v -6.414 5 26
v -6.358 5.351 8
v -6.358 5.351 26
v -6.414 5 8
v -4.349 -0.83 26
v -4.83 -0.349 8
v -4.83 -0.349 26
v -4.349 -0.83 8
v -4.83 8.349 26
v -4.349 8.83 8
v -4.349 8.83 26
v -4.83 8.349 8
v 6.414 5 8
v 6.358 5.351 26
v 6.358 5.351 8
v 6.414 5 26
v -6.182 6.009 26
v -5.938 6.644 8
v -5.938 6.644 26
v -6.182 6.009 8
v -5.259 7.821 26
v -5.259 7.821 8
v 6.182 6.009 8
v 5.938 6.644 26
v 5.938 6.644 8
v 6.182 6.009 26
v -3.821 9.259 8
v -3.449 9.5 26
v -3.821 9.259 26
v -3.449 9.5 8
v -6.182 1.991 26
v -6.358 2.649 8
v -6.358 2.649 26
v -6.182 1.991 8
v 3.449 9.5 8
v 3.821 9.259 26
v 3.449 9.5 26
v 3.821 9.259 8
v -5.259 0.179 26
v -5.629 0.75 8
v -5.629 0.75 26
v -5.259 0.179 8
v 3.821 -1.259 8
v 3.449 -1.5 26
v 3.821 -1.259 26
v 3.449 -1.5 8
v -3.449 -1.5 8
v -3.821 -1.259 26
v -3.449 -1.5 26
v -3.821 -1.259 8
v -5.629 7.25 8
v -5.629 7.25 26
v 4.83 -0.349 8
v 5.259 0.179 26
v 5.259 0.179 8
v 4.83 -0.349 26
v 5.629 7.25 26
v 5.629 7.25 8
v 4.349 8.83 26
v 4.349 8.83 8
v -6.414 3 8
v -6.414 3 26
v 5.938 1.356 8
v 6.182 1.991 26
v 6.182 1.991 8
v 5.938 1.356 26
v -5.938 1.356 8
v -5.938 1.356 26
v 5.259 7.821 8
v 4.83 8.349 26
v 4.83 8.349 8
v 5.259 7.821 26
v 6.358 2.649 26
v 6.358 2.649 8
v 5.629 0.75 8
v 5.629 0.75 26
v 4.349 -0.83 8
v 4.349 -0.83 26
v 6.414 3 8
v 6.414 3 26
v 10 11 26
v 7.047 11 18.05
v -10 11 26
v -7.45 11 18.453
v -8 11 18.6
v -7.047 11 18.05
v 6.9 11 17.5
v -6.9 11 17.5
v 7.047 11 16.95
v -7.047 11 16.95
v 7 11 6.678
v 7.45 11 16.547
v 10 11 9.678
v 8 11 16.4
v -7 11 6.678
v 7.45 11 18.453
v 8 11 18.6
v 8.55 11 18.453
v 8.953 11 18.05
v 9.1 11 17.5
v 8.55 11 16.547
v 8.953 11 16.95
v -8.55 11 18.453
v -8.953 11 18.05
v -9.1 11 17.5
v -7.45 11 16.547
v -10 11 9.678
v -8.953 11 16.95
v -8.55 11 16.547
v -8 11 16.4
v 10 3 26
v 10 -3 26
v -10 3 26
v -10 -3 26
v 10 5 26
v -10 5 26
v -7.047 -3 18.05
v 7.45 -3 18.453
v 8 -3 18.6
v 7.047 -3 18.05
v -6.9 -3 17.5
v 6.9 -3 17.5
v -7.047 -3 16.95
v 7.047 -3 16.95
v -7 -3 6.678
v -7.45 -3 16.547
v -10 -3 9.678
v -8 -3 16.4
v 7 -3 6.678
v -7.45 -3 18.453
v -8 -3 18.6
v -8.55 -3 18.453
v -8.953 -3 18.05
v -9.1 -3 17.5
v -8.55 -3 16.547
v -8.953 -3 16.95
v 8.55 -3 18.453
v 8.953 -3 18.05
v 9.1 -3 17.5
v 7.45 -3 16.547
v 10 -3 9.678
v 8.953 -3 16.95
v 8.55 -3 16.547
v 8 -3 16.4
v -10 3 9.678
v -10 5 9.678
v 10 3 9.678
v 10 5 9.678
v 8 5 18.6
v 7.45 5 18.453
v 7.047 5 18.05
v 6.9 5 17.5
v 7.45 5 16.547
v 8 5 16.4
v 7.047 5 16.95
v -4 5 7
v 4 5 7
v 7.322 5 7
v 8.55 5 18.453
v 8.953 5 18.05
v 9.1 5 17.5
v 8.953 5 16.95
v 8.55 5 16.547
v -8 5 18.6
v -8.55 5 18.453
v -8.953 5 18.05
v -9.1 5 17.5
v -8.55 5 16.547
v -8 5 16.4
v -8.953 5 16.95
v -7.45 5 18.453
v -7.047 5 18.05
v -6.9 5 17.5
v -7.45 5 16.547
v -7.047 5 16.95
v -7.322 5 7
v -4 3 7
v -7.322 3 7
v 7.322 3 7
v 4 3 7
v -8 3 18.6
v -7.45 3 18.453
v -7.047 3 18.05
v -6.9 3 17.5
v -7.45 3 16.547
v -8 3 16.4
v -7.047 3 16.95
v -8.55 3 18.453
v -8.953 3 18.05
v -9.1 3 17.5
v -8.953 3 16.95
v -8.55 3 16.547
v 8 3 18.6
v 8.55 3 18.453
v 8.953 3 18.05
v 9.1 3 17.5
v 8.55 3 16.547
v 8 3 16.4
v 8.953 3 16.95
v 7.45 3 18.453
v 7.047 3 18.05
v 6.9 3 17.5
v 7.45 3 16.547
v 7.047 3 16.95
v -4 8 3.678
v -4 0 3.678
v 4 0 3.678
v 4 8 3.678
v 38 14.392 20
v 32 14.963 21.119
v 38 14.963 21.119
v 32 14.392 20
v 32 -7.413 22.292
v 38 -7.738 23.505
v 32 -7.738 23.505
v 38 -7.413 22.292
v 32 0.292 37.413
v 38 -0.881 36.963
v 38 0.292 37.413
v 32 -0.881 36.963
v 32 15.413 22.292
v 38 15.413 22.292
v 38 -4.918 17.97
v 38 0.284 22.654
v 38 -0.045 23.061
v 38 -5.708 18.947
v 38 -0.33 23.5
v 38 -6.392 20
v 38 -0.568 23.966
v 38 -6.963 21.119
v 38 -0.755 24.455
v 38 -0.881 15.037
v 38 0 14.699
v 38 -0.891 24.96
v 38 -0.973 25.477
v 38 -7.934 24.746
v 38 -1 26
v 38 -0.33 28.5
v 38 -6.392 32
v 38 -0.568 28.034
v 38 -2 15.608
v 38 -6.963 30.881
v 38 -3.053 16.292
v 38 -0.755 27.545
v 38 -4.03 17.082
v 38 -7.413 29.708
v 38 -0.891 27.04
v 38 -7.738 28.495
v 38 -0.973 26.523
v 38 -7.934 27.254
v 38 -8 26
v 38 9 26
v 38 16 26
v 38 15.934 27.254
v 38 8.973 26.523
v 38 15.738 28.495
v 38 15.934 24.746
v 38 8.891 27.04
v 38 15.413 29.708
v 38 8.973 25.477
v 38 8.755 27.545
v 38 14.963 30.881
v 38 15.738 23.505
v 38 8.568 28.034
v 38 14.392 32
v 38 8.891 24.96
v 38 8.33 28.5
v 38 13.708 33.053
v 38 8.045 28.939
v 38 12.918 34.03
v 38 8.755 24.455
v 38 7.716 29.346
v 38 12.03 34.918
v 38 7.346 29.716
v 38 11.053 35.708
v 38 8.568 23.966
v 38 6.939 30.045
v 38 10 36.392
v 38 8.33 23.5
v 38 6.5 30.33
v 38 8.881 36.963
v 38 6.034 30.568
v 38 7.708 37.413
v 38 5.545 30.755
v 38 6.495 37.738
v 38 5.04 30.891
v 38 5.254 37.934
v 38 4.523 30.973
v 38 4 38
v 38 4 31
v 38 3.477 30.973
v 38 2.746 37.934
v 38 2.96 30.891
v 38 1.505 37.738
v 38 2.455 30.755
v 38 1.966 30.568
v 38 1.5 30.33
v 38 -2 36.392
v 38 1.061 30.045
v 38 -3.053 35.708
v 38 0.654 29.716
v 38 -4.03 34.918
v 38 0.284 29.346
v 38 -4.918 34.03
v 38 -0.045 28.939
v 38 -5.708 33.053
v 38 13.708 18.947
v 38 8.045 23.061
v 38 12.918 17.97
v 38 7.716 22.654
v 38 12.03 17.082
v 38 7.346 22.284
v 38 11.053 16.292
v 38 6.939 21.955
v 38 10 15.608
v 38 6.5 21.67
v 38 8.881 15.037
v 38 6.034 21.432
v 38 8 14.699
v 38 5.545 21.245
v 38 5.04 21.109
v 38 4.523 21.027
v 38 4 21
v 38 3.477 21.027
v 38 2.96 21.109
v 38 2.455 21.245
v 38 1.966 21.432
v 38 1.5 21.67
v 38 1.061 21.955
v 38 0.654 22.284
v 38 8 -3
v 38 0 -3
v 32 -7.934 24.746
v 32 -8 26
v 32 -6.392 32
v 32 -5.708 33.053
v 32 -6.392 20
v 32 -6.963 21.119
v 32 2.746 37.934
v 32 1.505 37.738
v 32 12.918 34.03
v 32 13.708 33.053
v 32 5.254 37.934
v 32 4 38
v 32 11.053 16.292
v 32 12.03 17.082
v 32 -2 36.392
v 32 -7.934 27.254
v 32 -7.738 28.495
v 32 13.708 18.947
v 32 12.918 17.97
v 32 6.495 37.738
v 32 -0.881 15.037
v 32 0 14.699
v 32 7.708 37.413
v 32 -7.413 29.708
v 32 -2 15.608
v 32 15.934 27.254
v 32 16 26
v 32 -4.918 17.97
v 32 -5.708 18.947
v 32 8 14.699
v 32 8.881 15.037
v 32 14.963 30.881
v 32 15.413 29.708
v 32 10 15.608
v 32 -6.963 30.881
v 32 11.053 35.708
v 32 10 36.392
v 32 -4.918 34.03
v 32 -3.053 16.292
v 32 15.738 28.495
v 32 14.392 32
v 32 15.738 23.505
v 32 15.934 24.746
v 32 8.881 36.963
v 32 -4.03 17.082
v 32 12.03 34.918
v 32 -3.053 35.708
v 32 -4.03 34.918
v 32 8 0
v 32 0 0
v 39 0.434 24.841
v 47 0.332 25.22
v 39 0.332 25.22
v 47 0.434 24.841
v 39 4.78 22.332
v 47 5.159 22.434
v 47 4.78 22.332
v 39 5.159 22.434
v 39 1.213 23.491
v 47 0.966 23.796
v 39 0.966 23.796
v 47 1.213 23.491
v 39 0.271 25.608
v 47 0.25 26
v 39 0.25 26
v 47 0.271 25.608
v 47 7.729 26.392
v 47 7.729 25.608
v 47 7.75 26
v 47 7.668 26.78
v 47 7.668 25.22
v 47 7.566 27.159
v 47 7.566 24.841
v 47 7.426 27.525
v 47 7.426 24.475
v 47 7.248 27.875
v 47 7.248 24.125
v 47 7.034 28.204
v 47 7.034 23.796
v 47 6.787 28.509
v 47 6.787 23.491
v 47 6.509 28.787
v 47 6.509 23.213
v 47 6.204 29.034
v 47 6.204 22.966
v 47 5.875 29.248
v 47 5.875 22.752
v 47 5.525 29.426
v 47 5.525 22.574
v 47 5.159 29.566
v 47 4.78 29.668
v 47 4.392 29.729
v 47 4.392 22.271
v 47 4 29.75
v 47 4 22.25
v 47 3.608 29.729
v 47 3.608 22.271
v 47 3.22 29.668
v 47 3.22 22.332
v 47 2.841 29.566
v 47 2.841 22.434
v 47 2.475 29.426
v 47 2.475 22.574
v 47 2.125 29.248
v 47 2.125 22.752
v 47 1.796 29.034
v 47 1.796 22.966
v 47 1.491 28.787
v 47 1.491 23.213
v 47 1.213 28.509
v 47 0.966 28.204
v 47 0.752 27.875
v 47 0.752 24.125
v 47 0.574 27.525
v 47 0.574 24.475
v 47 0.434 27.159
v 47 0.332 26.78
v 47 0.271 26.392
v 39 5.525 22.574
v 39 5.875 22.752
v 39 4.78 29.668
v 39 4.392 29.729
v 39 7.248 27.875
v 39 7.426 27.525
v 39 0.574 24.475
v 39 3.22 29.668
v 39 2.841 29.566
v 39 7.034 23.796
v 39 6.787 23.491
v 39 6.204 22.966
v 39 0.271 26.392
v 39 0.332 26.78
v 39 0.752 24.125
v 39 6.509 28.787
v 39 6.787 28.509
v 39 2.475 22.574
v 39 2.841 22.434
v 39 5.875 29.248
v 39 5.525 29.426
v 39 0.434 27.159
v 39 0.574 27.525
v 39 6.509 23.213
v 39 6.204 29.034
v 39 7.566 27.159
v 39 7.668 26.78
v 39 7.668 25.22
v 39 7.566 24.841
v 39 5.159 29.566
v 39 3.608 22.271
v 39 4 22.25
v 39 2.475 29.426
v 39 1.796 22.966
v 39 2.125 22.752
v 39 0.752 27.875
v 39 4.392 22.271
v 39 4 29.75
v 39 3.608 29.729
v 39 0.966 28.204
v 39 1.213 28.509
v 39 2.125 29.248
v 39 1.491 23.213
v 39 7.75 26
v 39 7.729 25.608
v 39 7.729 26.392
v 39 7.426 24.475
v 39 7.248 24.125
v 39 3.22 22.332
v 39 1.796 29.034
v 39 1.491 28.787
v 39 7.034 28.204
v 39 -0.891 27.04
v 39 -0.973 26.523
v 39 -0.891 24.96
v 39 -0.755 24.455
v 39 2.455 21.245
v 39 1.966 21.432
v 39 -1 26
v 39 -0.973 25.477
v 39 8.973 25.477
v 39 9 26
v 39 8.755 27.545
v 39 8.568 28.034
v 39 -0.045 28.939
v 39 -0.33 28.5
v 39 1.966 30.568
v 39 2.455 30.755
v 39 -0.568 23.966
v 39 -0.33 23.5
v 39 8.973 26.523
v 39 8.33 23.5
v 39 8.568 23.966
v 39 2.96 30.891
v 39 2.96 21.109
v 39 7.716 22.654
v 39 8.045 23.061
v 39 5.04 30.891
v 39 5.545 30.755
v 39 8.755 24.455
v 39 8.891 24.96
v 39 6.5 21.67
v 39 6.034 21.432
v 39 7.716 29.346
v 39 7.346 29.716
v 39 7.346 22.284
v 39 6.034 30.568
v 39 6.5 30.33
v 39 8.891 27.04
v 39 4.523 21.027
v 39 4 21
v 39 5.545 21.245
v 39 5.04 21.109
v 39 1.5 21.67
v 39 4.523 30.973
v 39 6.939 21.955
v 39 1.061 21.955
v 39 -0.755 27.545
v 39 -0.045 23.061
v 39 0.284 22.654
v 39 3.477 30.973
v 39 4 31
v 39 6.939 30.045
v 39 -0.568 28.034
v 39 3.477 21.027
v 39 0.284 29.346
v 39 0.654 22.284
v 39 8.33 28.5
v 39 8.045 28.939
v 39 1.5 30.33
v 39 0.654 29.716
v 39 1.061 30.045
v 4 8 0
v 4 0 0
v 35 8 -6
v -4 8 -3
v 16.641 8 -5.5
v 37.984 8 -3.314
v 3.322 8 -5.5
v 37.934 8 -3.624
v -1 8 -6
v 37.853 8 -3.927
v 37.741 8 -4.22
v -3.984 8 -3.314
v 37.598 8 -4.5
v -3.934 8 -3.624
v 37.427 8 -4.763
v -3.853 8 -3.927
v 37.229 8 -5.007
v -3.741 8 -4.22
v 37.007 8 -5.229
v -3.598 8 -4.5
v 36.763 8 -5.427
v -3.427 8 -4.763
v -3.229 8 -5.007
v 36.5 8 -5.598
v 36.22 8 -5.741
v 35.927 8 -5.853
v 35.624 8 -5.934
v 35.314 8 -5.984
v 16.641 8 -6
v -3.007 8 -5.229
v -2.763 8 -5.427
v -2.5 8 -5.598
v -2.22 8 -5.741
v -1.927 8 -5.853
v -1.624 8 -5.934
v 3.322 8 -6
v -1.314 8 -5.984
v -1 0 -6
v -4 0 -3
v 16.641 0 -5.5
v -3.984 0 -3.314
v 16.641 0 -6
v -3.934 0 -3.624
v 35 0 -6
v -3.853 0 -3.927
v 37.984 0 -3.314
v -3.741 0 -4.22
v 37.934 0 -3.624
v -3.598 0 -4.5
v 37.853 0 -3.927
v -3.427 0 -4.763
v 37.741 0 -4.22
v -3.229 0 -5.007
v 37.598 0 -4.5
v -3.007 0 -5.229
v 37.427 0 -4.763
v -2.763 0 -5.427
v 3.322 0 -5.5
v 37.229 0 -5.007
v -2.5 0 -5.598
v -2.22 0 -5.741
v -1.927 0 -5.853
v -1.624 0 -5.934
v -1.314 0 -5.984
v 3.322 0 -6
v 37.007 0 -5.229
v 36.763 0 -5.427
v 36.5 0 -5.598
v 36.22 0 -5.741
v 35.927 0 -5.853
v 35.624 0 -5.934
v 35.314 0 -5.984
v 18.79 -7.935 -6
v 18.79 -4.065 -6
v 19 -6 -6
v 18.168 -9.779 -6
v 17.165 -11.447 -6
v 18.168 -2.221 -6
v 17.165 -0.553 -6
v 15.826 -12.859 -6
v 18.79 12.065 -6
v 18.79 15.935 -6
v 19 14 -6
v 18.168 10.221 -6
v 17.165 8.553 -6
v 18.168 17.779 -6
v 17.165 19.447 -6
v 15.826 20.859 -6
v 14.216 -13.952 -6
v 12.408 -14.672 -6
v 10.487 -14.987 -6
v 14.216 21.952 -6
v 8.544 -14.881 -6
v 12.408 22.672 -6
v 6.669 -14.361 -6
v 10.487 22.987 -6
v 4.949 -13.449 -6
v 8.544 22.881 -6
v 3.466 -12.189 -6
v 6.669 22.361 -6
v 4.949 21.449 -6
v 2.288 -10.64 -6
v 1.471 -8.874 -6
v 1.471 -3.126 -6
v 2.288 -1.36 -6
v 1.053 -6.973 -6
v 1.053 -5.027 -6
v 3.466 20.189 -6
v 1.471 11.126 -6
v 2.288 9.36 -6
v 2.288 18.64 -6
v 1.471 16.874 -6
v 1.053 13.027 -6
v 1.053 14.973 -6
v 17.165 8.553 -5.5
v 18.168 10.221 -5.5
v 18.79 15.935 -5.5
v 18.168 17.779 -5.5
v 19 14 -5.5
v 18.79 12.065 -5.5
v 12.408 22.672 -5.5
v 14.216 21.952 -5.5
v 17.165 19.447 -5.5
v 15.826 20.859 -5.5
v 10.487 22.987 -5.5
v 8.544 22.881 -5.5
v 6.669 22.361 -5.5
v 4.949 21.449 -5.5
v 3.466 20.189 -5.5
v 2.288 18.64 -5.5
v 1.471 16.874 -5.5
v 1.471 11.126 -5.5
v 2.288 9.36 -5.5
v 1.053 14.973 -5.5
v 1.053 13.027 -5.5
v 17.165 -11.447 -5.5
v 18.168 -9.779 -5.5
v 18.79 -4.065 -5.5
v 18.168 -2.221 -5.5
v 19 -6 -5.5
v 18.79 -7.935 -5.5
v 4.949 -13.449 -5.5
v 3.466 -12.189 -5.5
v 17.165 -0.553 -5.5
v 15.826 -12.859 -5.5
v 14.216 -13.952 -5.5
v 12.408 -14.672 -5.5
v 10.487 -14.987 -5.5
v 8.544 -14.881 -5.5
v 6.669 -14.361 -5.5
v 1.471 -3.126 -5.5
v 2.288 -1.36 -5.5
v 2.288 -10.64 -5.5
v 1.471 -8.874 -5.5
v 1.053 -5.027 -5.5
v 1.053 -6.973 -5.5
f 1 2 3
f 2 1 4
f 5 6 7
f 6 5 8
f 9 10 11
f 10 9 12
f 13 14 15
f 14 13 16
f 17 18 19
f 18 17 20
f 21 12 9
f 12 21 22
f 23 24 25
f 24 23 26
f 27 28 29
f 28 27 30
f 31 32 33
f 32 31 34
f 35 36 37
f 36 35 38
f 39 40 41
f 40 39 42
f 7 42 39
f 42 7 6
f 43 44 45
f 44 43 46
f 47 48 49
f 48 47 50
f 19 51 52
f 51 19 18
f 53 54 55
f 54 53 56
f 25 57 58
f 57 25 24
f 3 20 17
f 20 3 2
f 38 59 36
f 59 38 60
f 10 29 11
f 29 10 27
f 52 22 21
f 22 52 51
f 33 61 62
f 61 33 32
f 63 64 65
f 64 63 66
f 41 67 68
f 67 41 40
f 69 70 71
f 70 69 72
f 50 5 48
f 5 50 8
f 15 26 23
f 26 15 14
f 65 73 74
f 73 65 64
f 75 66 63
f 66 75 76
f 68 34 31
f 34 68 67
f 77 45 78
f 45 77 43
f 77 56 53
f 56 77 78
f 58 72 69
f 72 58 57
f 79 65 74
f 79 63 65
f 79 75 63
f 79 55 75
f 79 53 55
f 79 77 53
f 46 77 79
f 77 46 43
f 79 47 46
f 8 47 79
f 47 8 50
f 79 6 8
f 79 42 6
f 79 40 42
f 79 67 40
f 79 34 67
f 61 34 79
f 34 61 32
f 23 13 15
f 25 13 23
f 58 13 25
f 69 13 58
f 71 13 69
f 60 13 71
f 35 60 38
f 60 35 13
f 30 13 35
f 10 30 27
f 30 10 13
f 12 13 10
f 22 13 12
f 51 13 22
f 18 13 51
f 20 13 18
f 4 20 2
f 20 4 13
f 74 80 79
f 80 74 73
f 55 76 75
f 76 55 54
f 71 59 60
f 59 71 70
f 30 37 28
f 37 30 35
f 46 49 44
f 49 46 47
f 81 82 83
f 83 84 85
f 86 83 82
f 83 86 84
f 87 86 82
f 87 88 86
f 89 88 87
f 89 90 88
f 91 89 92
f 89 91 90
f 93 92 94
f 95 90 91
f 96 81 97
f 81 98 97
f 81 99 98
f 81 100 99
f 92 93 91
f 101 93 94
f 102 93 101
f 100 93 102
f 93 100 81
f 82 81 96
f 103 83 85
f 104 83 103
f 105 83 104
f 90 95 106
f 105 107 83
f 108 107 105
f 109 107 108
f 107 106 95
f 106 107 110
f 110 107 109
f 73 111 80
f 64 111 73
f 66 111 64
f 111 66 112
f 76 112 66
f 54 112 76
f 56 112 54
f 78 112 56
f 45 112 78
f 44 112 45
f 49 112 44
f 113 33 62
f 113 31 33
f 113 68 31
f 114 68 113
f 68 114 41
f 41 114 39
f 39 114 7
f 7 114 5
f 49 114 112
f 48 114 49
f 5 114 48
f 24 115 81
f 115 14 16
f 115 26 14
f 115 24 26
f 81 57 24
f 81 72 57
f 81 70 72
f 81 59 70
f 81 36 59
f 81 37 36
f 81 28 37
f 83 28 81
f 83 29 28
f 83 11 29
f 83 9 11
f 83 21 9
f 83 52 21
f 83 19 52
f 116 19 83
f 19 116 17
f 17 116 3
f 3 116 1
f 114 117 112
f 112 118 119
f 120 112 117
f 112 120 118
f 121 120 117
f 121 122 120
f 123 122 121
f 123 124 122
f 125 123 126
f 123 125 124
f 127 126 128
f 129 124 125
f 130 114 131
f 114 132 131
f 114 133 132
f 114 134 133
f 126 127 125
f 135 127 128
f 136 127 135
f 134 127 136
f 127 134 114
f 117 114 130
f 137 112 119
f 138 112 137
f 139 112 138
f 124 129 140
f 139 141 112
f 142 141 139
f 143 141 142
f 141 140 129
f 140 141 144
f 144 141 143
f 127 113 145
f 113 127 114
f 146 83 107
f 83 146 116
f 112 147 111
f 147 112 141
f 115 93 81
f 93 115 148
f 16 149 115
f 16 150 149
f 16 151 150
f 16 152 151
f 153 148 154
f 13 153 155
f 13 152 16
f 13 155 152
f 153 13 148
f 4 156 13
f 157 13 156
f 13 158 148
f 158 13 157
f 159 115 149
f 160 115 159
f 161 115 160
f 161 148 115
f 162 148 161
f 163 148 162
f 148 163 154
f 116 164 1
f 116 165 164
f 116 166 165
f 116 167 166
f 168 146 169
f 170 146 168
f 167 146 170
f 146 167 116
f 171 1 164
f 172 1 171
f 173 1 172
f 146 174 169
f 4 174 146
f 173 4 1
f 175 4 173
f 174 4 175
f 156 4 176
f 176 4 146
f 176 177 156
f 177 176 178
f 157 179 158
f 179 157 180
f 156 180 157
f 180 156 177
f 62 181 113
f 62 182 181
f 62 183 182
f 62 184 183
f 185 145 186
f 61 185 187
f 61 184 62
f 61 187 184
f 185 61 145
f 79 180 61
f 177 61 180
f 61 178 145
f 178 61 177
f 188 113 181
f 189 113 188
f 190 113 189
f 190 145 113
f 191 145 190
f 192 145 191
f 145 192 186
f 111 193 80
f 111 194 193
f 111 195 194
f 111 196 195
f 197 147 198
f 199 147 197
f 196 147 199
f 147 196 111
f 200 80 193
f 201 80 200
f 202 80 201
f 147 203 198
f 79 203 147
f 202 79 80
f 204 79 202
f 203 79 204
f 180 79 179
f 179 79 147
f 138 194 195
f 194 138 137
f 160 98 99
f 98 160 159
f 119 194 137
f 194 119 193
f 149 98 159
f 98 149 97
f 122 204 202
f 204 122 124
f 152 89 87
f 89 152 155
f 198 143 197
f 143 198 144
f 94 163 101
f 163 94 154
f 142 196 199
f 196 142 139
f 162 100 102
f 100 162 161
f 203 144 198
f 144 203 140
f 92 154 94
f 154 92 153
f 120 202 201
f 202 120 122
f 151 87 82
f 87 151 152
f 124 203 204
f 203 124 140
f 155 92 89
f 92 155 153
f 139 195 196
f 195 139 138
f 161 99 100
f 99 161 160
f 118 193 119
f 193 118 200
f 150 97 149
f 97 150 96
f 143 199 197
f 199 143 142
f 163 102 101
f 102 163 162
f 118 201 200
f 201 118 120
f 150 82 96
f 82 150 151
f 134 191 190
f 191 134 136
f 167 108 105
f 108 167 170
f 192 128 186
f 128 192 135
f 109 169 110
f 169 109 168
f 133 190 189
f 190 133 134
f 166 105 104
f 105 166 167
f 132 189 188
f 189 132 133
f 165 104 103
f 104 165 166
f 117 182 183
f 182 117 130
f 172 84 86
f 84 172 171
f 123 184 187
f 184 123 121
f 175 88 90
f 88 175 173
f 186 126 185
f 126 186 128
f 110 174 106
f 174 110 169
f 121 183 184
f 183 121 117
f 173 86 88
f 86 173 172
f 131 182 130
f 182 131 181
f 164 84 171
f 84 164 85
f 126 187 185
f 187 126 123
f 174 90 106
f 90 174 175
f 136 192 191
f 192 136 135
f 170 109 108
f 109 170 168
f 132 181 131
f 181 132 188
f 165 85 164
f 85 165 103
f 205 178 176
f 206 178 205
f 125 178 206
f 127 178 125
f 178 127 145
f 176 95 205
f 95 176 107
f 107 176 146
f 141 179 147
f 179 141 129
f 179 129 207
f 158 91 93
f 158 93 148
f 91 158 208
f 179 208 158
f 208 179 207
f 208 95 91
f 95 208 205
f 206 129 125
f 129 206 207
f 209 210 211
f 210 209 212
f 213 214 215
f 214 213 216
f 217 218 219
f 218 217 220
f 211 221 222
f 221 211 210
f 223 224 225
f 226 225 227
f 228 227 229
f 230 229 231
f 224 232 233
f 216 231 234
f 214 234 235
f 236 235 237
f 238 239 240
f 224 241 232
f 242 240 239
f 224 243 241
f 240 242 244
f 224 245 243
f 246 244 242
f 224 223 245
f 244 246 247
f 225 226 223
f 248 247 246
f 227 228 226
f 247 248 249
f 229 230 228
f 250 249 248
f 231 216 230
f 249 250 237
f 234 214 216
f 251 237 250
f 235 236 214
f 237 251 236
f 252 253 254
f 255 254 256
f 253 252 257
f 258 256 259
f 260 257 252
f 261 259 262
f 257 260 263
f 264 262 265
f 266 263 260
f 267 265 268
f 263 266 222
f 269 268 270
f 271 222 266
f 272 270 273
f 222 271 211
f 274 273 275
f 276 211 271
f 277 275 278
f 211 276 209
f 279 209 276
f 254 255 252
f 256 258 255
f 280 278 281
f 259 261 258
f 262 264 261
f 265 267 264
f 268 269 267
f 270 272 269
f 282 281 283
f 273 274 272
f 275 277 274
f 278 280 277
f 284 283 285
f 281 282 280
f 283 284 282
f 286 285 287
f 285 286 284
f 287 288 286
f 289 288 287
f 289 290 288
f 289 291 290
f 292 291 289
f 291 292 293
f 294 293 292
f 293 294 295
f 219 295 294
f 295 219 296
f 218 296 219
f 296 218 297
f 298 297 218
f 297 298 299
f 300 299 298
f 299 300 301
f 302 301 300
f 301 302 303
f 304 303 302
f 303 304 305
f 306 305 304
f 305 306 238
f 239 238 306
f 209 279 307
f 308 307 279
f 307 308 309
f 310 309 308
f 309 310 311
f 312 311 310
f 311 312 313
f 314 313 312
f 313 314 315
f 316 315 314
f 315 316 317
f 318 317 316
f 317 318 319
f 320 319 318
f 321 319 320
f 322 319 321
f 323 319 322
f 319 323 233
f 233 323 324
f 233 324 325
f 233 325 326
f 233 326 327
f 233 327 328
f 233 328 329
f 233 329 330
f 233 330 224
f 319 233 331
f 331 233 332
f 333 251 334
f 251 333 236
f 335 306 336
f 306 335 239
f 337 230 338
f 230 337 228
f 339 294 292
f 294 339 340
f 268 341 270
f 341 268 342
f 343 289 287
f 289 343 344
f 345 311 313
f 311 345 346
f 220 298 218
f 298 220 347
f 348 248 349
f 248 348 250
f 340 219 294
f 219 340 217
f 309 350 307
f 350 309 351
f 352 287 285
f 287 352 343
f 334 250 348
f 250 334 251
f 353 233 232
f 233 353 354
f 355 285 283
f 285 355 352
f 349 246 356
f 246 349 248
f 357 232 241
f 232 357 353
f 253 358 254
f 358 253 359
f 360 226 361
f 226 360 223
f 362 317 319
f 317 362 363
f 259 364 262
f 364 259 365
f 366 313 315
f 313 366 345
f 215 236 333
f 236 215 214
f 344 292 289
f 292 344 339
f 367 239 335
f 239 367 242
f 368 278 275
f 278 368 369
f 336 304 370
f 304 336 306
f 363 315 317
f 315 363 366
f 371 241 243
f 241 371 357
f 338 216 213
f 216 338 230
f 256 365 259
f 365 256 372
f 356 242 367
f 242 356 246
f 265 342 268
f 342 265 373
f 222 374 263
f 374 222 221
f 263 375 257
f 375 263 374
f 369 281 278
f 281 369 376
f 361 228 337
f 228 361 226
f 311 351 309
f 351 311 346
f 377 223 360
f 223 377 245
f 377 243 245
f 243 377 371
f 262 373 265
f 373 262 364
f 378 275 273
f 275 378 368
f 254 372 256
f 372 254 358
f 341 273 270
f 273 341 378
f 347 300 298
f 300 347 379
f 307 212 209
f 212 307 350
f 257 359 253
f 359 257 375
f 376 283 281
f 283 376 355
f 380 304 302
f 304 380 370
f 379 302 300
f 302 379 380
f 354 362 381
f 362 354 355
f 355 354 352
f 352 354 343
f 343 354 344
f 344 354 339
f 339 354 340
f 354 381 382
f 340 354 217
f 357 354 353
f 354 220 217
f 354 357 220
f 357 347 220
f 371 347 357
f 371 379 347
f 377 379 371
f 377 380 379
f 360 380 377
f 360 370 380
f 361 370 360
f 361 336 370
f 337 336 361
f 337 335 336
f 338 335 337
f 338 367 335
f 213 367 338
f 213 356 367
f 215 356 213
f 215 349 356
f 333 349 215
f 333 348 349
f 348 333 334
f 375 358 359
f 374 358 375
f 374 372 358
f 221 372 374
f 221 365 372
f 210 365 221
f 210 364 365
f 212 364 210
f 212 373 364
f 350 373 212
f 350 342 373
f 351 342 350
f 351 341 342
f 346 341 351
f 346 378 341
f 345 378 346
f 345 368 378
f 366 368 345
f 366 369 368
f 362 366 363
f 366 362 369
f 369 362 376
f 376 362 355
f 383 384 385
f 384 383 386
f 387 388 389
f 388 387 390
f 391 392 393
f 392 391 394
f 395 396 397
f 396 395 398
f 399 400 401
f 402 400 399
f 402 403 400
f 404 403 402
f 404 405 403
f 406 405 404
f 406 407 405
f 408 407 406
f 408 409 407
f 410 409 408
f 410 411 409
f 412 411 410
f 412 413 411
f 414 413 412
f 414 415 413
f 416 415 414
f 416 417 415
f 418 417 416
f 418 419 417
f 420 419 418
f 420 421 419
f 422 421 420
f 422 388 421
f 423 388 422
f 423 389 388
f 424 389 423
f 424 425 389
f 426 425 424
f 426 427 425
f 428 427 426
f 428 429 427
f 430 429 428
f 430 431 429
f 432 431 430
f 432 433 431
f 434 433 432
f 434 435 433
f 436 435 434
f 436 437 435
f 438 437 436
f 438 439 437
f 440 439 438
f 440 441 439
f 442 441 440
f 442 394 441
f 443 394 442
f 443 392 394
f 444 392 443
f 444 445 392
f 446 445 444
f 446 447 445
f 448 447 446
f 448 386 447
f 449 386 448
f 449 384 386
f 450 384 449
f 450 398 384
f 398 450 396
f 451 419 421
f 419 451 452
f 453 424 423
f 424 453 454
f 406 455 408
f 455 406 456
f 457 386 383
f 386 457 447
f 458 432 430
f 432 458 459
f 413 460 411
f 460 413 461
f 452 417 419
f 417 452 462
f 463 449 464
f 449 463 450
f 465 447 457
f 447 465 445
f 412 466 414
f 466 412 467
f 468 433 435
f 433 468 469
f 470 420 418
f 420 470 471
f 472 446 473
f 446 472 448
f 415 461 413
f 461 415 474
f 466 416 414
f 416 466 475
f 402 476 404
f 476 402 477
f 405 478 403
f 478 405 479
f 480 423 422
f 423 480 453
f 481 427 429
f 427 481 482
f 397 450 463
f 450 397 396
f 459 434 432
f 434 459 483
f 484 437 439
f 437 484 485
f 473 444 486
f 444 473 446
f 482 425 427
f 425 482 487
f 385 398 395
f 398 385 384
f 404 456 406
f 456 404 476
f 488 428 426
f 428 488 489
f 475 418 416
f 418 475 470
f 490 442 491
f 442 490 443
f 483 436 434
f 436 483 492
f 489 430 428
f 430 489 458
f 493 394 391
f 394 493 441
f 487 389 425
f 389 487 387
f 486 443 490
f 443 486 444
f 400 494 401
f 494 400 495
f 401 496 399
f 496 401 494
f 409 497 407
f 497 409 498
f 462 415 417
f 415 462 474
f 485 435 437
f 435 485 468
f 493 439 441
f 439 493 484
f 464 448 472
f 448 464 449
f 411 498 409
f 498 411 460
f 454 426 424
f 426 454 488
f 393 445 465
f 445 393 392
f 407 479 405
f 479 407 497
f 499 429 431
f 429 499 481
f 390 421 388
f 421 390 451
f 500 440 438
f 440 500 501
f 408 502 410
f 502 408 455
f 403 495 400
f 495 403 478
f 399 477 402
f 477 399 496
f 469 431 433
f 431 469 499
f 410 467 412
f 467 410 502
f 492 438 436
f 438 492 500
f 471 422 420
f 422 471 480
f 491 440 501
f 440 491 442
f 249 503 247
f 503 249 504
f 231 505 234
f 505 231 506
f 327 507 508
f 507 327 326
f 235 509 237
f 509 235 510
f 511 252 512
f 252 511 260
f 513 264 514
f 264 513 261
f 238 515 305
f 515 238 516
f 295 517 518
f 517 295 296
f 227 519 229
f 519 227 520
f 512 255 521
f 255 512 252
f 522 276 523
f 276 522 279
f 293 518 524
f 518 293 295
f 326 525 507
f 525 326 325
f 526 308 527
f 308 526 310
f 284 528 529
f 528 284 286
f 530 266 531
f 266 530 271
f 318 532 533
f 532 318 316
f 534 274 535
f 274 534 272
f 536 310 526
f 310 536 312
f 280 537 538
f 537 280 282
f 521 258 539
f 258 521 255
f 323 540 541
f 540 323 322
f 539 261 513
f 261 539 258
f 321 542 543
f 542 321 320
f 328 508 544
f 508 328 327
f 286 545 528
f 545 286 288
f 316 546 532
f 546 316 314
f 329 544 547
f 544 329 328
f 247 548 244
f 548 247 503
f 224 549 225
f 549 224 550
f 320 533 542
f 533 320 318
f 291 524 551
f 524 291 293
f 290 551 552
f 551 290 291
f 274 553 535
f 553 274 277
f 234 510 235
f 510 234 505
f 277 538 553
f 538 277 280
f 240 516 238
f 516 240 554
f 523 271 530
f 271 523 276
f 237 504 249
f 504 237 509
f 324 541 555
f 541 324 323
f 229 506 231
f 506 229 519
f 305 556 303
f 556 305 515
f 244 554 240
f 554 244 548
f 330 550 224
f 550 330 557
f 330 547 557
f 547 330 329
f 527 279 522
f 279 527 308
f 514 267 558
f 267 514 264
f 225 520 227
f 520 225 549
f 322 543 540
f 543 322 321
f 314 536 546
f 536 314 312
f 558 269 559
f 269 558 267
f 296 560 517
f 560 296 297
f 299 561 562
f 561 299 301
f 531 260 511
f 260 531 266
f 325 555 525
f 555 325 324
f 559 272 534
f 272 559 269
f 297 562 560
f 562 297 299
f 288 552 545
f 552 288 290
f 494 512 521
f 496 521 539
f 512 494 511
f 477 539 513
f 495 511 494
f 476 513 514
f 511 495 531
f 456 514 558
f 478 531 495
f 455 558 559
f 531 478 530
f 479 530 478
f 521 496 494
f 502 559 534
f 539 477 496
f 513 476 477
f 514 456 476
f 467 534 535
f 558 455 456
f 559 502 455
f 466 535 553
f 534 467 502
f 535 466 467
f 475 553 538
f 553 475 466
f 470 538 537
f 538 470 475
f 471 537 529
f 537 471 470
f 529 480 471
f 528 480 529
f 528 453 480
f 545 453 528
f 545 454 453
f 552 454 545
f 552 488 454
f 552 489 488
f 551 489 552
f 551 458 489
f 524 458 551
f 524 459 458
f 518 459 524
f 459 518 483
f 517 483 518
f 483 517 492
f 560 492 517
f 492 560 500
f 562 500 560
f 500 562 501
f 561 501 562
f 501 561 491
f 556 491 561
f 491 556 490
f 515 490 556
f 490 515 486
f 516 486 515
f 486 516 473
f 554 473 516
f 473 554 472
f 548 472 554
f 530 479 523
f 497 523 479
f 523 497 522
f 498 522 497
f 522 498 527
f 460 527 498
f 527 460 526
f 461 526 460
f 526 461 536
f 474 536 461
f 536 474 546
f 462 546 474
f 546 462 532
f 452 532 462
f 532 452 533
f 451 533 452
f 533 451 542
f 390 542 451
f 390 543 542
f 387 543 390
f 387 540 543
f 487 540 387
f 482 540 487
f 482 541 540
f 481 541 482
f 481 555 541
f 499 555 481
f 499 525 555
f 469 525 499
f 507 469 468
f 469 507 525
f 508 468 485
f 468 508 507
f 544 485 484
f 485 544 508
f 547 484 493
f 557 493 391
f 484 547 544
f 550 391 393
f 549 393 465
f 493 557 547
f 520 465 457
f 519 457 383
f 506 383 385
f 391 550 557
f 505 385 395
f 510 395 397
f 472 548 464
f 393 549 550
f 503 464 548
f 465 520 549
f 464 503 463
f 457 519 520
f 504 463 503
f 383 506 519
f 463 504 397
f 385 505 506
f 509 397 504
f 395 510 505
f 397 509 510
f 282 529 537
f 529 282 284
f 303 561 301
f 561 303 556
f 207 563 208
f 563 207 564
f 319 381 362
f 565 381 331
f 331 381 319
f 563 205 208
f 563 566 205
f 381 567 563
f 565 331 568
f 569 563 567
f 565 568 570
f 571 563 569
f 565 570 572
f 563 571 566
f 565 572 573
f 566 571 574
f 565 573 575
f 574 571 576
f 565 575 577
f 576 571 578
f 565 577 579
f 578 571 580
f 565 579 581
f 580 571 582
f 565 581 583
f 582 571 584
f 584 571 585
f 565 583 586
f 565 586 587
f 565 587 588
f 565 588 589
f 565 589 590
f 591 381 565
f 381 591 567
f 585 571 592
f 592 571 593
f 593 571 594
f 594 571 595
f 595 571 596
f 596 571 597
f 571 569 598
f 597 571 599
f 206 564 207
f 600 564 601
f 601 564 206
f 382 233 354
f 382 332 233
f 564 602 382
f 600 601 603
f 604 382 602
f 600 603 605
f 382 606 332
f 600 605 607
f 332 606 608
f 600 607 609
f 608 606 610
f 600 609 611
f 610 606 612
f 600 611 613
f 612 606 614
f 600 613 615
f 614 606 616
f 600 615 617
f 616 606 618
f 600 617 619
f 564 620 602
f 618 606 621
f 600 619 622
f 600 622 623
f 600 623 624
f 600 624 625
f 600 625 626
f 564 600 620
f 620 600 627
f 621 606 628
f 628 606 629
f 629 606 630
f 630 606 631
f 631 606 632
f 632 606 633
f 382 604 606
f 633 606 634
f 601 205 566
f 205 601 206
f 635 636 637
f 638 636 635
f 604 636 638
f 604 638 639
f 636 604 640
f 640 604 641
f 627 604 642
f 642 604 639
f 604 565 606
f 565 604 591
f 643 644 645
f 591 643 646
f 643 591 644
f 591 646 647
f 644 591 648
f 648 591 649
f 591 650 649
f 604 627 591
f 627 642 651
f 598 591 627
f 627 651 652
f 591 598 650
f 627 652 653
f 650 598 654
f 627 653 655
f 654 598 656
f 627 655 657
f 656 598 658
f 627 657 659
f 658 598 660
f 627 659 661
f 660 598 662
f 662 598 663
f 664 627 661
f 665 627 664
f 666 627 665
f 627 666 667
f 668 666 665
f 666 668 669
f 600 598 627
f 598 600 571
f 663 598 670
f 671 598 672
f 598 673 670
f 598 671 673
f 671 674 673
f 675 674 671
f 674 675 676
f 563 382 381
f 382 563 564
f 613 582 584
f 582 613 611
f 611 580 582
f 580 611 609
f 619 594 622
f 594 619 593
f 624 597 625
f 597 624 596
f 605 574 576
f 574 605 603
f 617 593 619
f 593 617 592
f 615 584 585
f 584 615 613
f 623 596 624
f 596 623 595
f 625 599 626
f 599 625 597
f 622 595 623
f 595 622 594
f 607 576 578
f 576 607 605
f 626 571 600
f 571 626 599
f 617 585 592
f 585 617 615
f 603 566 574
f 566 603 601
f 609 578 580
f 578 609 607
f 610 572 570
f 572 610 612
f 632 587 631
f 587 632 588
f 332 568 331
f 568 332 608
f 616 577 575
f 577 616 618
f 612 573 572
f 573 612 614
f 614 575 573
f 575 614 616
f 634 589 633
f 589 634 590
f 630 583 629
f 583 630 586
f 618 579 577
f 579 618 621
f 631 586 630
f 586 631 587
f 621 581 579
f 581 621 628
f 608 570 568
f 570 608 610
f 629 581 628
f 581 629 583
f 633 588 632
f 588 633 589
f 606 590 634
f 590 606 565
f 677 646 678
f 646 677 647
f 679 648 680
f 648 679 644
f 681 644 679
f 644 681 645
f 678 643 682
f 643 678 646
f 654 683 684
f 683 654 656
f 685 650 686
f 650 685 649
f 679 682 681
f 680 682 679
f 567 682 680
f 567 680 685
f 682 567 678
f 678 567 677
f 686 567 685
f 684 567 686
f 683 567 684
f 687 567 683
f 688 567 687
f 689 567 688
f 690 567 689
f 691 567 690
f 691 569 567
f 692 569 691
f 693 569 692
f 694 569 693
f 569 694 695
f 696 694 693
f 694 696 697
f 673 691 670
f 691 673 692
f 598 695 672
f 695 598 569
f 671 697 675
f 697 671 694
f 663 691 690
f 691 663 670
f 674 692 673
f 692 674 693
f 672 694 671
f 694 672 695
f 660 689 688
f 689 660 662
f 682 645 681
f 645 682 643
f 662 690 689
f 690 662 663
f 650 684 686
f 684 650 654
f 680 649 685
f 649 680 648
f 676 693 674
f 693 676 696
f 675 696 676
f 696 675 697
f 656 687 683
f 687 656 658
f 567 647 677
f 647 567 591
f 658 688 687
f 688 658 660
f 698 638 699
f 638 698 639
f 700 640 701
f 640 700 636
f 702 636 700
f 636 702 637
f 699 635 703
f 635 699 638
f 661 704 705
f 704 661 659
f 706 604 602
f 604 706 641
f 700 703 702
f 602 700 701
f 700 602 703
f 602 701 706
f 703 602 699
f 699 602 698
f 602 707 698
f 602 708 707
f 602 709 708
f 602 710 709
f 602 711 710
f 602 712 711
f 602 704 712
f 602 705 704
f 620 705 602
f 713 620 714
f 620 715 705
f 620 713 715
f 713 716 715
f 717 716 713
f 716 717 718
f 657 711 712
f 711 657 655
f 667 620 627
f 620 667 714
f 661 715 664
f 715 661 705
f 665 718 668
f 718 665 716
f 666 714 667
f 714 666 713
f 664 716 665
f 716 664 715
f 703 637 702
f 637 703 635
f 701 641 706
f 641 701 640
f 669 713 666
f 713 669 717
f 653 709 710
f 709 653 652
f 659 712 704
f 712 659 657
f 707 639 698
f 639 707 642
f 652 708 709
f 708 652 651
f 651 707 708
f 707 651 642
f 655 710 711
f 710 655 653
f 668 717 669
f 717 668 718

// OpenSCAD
translate([0,4,3])rotate([0,0,90])
clamp();

// apoyos para imprimir sin despegarse
translate([10,14,-6])cylinder(d=18,h=0.5);
translate([10,-6,-6])cylinder(d=18,h=0.5);

rotate([-90,0,0]) bracket();

module bracket(){
$fn=60;

translate([32,-26,4])rotate([0,90,0])
cylinder(d=24,h=6);
translate([32,-26,4])rotate([0,90,0])
cylinder(d=7.5,h=15);
translate([32,-26,4])rotate([0,90,0])
cylinder(d=10,h=7);

translate([-4,-7,0])cube([8,10,8]);
translate([32,-22,0])cube([6,25,8]);
translate([-1,0,0])cube([36,6,8]);

translate([-1,3,0])rotate([0,0,-90])
cylinder(d=6,h=8);
translate([35,3,0])rotate([0,0,-90])
cylinder(d=6,h=8);

}
//translate([-18,-20,-1])cube([10,10,20]);

module clamp(){
difference(){
translate([-7,-10,0])
cube([14,20,23]);
difference(){
    translate([0,0,5])cylinder(d=13,h=25,$fn=60);
    translate([6.5,0,12])cube([2,12,25],center=true);
    translate([-6.5,0,12])cube([2,12,25],center=true);
}
translate([-1,-11,4])cube([2,22,25]);
translate([-9,-8,14.5])rotate([0,90,0])
cylinder(d=2.2,h=21,$fn=12);
translate([-9,8,14.5])rotate([0,90,0])
cylinder(d=2.2,h=21,$fn=12);
translate([0,21,0])rotate([45,0,0])cube(size=[25,25,25],center=true);
translate([0,-21,0])rotate([45,0,0])cube(size=[25,25,25],center=true);
translate([21,0,0])rotate([0,0,90])rotate([45,0,0])
cube(size=[25,25,25],center=true);
translate([-21,0,0])rotate([0,0,90])rotate([45,0,0])
cube(size=[25,25,25],center=true);
}
}
